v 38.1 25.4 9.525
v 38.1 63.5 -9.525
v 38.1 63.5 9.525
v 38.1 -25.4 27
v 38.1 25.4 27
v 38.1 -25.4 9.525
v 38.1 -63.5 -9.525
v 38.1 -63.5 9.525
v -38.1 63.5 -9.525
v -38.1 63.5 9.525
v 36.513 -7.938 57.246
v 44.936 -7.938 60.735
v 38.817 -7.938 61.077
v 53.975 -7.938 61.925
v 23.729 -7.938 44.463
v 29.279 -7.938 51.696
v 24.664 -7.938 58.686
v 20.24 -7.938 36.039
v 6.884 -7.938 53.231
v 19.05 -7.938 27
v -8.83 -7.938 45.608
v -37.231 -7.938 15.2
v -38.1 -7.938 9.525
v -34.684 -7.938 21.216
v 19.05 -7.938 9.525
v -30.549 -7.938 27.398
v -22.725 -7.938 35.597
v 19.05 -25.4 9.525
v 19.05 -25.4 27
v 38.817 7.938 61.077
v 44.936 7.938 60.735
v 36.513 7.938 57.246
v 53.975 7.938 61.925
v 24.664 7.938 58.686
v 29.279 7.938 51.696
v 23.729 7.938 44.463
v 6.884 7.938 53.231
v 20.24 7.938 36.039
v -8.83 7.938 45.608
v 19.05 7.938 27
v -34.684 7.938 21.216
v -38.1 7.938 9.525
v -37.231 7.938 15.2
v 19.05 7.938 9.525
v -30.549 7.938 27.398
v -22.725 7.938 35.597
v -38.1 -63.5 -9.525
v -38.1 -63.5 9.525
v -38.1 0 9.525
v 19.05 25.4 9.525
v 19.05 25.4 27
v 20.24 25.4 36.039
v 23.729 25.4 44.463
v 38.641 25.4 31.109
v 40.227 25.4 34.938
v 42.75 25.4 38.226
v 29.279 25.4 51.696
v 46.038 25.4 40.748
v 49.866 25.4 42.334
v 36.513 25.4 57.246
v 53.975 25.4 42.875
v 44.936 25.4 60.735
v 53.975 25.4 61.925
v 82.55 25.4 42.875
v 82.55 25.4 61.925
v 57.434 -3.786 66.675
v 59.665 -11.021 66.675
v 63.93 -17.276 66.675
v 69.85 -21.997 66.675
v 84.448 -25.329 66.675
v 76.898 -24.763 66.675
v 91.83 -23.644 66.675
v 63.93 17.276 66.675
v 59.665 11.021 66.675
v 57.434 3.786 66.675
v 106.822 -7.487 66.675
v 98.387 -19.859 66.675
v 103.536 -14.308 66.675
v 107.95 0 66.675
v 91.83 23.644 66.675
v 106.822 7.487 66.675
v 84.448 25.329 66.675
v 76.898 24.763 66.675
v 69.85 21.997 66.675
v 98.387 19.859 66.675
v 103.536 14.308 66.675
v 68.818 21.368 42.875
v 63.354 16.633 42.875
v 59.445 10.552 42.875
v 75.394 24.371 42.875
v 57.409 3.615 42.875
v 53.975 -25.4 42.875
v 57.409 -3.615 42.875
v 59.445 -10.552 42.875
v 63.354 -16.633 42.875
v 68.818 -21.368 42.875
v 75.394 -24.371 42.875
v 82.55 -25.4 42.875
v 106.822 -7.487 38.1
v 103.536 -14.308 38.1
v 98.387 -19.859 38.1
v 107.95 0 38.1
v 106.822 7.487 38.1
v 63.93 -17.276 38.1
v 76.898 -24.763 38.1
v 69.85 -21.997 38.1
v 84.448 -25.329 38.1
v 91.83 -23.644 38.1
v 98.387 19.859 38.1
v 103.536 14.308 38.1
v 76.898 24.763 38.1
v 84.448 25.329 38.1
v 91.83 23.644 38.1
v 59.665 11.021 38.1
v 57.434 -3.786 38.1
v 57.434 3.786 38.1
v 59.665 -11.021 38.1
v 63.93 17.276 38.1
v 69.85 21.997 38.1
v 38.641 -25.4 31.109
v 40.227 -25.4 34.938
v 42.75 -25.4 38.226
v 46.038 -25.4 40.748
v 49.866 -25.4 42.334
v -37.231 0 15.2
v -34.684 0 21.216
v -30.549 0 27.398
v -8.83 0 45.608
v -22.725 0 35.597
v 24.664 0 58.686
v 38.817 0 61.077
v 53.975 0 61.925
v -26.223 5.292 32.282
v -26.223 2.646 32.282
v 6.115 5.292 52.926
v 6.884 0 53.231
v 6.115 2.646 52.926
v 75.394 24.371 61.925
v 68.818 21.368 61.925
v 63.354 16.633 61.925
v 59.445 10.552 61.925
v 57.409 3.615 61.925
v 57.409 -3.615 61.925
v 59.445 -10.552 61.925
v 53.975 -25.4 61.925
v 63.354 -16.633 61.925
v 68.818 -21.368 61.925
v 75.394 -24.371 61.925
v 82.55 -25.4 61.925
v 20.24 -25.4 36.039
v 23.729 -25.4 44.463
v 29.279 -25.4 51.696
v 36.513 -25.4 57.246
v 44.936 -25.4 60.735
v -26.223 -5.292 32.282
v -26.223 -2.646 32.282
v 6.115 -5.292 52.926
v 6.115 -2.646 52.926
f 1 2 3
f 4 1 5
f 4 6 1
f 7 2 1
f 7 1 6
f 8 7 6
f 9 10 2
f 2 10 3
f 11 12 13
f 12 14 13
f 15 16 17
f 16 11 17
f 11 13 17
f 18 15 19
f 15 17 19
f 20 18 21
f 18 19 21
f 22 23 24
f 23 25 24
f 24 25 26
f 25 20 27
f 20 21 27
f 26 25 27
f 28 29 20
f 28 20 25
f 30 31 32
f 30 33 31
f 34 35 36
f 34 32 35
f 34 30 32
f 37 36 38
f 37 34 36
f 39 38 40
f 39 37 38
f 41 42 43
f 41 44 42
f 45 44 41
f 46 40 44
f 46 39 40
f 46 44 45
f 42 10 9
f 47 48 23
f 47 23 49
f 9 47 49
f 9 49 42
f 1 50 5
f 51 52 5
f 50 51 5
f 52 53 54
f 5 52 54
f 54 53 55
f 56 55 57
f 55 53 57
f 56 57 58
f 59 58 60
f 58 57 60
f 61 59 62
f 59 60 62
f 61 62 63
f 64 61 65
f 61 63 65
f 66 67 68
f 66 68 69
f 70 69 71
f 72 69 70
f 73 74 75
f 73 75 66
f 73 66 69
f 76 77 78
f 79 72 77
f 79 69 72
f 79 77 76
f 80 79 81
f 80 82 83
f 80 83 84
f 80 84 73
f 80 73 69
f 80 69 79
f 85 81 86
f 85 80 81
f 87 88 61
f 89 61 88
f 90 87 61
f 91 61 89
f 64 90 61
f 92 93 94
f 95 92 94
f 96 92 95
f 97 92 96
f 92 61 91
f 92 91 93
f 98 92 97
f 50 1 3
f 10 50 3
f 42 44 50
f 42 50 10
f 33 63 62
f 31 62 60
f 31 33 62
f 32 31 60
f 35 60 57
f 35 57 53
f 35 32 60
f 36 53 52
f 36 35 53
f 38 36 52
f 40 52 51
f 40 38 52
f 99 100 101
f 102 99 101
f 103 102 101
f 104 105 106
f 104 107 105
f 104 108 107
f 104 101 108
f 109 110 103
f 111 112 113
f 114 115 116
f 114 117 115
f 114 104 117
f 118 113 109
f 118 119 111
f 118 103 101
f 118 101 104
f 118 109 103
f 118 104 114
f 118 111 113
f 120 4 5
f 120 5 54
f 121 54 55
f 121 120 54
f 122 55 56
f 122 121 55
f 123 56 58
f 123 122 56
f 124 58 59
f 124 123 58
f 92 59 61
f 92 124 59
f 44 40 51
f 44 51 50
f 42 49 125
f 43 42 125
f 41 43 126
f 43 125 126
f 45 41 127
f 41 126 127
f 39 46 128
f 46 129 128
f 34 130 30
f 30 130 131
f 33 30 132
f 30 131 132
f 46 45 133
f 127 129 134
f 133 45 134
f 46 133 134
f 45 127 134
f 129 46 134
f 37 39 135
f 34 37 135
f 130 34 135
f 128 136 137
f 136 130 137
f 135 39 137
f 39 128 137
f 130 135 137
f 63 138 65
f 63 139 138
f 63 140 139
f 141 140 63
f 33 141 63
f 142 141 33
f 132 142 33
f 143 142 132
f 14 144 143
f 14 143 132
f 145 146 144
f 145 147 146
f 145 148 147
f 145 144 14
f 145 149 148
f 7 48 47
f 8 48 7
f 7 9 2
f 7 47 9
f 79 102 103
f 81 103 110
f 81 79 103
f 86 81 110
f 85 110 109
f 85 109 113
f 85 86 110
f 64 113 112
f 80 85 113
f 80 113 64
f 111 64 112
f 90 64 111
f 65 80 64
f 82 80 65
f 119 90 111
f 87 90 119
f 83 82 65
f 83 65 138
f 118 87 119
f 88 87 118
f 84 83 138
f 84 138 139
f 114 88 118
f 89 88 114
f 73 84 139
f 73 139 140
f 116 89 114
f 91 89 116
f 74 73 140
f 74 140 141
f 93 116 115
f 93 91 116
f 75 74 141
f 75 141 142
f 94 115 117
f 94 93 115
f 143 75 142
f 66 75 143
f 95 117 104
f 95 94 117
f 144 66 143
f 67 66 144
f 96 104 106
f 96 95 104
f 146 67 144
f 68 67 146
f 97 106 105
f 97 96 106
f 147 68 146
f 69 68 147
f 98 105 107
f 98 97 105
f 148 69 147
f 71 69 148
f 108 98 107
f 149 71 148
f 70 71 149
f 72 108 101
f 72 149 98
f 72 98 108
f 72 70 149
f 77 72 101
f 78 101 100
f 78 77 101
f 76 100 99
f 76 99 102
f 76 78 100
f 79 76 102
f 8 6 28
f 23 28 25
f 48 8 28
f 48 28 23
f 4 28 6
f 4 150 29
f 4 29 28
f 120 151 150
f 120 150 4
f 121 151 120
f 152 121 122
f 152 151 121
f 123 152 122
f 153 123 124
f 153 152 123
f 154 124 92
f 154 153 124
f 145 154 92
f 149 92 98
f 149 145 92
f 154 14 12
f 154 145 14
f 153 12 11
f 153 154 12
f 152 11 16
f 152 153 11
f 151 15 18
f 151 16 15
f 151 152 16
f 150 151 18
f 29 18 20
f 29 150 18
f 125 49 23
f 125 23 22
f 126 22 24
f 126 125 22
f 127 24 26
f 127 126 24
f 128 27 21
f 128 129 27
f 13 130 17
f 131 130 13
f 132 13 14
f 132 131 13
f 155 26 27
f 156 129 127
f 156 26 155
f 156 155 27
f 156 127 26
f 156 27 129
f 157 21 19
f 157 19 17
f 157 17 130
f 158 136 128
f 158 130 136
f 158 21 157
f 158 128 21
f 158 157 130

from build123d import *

# Parameters (mm, degrees)
F1_DEPTH = 63.5
F0_W     = 25.4
F0_H     = 19.05
F2_DEPTH = 25.4
F3_DEPTH = 7.9375


with BuildPart() as f1:
    # F0 (on Front) → F1 (new body, symmetric)
    with BuildSketch(Plane.XZ):
        Polygon((-38.1, -9.525), (38.1, -9.525), (38.1, 9.525), (19.05, 9.525), (-38.1, 9.525), align=None)
    extrude(amount=F1_DEPTH, both=True)

    # F0 (on Front) → F2 (join, symmetric)
    with BuildSketch(Plane.XZ):
        with BuildLine():
            Line((19.05, 9.525), (38.1, 9.525))
            Line((38.1, 9.525), (38.1, 27.0002))
            ThreePointArc((38.1, 27.0002), (42.7496798487, 38.2255201513), (53.975, 42.8752))
            Line((53.975, 42.8752), (57.15, 42.8752))
            Line((57.15, 42.8752), (57.15, 61.9252))
            Line((57.15, 61.9252), (53.975, 61.9252))
            ThreePointArc((53.975, 61.9252), (29.2792956671, 51.6959043329), (19.05, 27.0002))
            Line((19.05, 27.0002), (19.05, 9.525))
        make_face()
        with Locations((69.85, 52.4002)):
            Rectangle(F0_W, F0_H)
    extrude(amount=F2_DEPTH, both=True)

    # F0 (on Front) → F3 (join, symmetric)
    with BuildSketch(Plane.XZ):
        with BuildLine():
            add(Edge.make_bspline(
                [(-38.1, 9.525), (-38.1, 30.1610566676), (0, 61.9252), (53.975, 61.9252)],
                knots=[0, 0, 0, 0, 105.9414299745, 105.9414299745, 105.9414299745, 105.9414299745], degree=3))
            Line((-38.1, 9.525), (19.05, 9.525))
            Line((19.05, 9.525), (19.05, 27.0002))
            ThreePointArc((19.05, 27.0002), (29.2792956671, 51.6959043329), (53.975, 61.9252))
        make_face()
    extrude(amount=F3_DEPTH, both=True)

    # F0 (on Front) → F4 (revolve)
    with BuildSketch(Plane.XZ):
        Polygon((82.55, 66.675), (82.55, 61.9252), (82.55, 42.8752), (82.55, 38.1), (107.95, 38.1), (107.95, 66.675), align=None)
    revolve(axis=Axis((82.55, 0, 52.3875), (0, 0, 1)))


solid = f1.part
